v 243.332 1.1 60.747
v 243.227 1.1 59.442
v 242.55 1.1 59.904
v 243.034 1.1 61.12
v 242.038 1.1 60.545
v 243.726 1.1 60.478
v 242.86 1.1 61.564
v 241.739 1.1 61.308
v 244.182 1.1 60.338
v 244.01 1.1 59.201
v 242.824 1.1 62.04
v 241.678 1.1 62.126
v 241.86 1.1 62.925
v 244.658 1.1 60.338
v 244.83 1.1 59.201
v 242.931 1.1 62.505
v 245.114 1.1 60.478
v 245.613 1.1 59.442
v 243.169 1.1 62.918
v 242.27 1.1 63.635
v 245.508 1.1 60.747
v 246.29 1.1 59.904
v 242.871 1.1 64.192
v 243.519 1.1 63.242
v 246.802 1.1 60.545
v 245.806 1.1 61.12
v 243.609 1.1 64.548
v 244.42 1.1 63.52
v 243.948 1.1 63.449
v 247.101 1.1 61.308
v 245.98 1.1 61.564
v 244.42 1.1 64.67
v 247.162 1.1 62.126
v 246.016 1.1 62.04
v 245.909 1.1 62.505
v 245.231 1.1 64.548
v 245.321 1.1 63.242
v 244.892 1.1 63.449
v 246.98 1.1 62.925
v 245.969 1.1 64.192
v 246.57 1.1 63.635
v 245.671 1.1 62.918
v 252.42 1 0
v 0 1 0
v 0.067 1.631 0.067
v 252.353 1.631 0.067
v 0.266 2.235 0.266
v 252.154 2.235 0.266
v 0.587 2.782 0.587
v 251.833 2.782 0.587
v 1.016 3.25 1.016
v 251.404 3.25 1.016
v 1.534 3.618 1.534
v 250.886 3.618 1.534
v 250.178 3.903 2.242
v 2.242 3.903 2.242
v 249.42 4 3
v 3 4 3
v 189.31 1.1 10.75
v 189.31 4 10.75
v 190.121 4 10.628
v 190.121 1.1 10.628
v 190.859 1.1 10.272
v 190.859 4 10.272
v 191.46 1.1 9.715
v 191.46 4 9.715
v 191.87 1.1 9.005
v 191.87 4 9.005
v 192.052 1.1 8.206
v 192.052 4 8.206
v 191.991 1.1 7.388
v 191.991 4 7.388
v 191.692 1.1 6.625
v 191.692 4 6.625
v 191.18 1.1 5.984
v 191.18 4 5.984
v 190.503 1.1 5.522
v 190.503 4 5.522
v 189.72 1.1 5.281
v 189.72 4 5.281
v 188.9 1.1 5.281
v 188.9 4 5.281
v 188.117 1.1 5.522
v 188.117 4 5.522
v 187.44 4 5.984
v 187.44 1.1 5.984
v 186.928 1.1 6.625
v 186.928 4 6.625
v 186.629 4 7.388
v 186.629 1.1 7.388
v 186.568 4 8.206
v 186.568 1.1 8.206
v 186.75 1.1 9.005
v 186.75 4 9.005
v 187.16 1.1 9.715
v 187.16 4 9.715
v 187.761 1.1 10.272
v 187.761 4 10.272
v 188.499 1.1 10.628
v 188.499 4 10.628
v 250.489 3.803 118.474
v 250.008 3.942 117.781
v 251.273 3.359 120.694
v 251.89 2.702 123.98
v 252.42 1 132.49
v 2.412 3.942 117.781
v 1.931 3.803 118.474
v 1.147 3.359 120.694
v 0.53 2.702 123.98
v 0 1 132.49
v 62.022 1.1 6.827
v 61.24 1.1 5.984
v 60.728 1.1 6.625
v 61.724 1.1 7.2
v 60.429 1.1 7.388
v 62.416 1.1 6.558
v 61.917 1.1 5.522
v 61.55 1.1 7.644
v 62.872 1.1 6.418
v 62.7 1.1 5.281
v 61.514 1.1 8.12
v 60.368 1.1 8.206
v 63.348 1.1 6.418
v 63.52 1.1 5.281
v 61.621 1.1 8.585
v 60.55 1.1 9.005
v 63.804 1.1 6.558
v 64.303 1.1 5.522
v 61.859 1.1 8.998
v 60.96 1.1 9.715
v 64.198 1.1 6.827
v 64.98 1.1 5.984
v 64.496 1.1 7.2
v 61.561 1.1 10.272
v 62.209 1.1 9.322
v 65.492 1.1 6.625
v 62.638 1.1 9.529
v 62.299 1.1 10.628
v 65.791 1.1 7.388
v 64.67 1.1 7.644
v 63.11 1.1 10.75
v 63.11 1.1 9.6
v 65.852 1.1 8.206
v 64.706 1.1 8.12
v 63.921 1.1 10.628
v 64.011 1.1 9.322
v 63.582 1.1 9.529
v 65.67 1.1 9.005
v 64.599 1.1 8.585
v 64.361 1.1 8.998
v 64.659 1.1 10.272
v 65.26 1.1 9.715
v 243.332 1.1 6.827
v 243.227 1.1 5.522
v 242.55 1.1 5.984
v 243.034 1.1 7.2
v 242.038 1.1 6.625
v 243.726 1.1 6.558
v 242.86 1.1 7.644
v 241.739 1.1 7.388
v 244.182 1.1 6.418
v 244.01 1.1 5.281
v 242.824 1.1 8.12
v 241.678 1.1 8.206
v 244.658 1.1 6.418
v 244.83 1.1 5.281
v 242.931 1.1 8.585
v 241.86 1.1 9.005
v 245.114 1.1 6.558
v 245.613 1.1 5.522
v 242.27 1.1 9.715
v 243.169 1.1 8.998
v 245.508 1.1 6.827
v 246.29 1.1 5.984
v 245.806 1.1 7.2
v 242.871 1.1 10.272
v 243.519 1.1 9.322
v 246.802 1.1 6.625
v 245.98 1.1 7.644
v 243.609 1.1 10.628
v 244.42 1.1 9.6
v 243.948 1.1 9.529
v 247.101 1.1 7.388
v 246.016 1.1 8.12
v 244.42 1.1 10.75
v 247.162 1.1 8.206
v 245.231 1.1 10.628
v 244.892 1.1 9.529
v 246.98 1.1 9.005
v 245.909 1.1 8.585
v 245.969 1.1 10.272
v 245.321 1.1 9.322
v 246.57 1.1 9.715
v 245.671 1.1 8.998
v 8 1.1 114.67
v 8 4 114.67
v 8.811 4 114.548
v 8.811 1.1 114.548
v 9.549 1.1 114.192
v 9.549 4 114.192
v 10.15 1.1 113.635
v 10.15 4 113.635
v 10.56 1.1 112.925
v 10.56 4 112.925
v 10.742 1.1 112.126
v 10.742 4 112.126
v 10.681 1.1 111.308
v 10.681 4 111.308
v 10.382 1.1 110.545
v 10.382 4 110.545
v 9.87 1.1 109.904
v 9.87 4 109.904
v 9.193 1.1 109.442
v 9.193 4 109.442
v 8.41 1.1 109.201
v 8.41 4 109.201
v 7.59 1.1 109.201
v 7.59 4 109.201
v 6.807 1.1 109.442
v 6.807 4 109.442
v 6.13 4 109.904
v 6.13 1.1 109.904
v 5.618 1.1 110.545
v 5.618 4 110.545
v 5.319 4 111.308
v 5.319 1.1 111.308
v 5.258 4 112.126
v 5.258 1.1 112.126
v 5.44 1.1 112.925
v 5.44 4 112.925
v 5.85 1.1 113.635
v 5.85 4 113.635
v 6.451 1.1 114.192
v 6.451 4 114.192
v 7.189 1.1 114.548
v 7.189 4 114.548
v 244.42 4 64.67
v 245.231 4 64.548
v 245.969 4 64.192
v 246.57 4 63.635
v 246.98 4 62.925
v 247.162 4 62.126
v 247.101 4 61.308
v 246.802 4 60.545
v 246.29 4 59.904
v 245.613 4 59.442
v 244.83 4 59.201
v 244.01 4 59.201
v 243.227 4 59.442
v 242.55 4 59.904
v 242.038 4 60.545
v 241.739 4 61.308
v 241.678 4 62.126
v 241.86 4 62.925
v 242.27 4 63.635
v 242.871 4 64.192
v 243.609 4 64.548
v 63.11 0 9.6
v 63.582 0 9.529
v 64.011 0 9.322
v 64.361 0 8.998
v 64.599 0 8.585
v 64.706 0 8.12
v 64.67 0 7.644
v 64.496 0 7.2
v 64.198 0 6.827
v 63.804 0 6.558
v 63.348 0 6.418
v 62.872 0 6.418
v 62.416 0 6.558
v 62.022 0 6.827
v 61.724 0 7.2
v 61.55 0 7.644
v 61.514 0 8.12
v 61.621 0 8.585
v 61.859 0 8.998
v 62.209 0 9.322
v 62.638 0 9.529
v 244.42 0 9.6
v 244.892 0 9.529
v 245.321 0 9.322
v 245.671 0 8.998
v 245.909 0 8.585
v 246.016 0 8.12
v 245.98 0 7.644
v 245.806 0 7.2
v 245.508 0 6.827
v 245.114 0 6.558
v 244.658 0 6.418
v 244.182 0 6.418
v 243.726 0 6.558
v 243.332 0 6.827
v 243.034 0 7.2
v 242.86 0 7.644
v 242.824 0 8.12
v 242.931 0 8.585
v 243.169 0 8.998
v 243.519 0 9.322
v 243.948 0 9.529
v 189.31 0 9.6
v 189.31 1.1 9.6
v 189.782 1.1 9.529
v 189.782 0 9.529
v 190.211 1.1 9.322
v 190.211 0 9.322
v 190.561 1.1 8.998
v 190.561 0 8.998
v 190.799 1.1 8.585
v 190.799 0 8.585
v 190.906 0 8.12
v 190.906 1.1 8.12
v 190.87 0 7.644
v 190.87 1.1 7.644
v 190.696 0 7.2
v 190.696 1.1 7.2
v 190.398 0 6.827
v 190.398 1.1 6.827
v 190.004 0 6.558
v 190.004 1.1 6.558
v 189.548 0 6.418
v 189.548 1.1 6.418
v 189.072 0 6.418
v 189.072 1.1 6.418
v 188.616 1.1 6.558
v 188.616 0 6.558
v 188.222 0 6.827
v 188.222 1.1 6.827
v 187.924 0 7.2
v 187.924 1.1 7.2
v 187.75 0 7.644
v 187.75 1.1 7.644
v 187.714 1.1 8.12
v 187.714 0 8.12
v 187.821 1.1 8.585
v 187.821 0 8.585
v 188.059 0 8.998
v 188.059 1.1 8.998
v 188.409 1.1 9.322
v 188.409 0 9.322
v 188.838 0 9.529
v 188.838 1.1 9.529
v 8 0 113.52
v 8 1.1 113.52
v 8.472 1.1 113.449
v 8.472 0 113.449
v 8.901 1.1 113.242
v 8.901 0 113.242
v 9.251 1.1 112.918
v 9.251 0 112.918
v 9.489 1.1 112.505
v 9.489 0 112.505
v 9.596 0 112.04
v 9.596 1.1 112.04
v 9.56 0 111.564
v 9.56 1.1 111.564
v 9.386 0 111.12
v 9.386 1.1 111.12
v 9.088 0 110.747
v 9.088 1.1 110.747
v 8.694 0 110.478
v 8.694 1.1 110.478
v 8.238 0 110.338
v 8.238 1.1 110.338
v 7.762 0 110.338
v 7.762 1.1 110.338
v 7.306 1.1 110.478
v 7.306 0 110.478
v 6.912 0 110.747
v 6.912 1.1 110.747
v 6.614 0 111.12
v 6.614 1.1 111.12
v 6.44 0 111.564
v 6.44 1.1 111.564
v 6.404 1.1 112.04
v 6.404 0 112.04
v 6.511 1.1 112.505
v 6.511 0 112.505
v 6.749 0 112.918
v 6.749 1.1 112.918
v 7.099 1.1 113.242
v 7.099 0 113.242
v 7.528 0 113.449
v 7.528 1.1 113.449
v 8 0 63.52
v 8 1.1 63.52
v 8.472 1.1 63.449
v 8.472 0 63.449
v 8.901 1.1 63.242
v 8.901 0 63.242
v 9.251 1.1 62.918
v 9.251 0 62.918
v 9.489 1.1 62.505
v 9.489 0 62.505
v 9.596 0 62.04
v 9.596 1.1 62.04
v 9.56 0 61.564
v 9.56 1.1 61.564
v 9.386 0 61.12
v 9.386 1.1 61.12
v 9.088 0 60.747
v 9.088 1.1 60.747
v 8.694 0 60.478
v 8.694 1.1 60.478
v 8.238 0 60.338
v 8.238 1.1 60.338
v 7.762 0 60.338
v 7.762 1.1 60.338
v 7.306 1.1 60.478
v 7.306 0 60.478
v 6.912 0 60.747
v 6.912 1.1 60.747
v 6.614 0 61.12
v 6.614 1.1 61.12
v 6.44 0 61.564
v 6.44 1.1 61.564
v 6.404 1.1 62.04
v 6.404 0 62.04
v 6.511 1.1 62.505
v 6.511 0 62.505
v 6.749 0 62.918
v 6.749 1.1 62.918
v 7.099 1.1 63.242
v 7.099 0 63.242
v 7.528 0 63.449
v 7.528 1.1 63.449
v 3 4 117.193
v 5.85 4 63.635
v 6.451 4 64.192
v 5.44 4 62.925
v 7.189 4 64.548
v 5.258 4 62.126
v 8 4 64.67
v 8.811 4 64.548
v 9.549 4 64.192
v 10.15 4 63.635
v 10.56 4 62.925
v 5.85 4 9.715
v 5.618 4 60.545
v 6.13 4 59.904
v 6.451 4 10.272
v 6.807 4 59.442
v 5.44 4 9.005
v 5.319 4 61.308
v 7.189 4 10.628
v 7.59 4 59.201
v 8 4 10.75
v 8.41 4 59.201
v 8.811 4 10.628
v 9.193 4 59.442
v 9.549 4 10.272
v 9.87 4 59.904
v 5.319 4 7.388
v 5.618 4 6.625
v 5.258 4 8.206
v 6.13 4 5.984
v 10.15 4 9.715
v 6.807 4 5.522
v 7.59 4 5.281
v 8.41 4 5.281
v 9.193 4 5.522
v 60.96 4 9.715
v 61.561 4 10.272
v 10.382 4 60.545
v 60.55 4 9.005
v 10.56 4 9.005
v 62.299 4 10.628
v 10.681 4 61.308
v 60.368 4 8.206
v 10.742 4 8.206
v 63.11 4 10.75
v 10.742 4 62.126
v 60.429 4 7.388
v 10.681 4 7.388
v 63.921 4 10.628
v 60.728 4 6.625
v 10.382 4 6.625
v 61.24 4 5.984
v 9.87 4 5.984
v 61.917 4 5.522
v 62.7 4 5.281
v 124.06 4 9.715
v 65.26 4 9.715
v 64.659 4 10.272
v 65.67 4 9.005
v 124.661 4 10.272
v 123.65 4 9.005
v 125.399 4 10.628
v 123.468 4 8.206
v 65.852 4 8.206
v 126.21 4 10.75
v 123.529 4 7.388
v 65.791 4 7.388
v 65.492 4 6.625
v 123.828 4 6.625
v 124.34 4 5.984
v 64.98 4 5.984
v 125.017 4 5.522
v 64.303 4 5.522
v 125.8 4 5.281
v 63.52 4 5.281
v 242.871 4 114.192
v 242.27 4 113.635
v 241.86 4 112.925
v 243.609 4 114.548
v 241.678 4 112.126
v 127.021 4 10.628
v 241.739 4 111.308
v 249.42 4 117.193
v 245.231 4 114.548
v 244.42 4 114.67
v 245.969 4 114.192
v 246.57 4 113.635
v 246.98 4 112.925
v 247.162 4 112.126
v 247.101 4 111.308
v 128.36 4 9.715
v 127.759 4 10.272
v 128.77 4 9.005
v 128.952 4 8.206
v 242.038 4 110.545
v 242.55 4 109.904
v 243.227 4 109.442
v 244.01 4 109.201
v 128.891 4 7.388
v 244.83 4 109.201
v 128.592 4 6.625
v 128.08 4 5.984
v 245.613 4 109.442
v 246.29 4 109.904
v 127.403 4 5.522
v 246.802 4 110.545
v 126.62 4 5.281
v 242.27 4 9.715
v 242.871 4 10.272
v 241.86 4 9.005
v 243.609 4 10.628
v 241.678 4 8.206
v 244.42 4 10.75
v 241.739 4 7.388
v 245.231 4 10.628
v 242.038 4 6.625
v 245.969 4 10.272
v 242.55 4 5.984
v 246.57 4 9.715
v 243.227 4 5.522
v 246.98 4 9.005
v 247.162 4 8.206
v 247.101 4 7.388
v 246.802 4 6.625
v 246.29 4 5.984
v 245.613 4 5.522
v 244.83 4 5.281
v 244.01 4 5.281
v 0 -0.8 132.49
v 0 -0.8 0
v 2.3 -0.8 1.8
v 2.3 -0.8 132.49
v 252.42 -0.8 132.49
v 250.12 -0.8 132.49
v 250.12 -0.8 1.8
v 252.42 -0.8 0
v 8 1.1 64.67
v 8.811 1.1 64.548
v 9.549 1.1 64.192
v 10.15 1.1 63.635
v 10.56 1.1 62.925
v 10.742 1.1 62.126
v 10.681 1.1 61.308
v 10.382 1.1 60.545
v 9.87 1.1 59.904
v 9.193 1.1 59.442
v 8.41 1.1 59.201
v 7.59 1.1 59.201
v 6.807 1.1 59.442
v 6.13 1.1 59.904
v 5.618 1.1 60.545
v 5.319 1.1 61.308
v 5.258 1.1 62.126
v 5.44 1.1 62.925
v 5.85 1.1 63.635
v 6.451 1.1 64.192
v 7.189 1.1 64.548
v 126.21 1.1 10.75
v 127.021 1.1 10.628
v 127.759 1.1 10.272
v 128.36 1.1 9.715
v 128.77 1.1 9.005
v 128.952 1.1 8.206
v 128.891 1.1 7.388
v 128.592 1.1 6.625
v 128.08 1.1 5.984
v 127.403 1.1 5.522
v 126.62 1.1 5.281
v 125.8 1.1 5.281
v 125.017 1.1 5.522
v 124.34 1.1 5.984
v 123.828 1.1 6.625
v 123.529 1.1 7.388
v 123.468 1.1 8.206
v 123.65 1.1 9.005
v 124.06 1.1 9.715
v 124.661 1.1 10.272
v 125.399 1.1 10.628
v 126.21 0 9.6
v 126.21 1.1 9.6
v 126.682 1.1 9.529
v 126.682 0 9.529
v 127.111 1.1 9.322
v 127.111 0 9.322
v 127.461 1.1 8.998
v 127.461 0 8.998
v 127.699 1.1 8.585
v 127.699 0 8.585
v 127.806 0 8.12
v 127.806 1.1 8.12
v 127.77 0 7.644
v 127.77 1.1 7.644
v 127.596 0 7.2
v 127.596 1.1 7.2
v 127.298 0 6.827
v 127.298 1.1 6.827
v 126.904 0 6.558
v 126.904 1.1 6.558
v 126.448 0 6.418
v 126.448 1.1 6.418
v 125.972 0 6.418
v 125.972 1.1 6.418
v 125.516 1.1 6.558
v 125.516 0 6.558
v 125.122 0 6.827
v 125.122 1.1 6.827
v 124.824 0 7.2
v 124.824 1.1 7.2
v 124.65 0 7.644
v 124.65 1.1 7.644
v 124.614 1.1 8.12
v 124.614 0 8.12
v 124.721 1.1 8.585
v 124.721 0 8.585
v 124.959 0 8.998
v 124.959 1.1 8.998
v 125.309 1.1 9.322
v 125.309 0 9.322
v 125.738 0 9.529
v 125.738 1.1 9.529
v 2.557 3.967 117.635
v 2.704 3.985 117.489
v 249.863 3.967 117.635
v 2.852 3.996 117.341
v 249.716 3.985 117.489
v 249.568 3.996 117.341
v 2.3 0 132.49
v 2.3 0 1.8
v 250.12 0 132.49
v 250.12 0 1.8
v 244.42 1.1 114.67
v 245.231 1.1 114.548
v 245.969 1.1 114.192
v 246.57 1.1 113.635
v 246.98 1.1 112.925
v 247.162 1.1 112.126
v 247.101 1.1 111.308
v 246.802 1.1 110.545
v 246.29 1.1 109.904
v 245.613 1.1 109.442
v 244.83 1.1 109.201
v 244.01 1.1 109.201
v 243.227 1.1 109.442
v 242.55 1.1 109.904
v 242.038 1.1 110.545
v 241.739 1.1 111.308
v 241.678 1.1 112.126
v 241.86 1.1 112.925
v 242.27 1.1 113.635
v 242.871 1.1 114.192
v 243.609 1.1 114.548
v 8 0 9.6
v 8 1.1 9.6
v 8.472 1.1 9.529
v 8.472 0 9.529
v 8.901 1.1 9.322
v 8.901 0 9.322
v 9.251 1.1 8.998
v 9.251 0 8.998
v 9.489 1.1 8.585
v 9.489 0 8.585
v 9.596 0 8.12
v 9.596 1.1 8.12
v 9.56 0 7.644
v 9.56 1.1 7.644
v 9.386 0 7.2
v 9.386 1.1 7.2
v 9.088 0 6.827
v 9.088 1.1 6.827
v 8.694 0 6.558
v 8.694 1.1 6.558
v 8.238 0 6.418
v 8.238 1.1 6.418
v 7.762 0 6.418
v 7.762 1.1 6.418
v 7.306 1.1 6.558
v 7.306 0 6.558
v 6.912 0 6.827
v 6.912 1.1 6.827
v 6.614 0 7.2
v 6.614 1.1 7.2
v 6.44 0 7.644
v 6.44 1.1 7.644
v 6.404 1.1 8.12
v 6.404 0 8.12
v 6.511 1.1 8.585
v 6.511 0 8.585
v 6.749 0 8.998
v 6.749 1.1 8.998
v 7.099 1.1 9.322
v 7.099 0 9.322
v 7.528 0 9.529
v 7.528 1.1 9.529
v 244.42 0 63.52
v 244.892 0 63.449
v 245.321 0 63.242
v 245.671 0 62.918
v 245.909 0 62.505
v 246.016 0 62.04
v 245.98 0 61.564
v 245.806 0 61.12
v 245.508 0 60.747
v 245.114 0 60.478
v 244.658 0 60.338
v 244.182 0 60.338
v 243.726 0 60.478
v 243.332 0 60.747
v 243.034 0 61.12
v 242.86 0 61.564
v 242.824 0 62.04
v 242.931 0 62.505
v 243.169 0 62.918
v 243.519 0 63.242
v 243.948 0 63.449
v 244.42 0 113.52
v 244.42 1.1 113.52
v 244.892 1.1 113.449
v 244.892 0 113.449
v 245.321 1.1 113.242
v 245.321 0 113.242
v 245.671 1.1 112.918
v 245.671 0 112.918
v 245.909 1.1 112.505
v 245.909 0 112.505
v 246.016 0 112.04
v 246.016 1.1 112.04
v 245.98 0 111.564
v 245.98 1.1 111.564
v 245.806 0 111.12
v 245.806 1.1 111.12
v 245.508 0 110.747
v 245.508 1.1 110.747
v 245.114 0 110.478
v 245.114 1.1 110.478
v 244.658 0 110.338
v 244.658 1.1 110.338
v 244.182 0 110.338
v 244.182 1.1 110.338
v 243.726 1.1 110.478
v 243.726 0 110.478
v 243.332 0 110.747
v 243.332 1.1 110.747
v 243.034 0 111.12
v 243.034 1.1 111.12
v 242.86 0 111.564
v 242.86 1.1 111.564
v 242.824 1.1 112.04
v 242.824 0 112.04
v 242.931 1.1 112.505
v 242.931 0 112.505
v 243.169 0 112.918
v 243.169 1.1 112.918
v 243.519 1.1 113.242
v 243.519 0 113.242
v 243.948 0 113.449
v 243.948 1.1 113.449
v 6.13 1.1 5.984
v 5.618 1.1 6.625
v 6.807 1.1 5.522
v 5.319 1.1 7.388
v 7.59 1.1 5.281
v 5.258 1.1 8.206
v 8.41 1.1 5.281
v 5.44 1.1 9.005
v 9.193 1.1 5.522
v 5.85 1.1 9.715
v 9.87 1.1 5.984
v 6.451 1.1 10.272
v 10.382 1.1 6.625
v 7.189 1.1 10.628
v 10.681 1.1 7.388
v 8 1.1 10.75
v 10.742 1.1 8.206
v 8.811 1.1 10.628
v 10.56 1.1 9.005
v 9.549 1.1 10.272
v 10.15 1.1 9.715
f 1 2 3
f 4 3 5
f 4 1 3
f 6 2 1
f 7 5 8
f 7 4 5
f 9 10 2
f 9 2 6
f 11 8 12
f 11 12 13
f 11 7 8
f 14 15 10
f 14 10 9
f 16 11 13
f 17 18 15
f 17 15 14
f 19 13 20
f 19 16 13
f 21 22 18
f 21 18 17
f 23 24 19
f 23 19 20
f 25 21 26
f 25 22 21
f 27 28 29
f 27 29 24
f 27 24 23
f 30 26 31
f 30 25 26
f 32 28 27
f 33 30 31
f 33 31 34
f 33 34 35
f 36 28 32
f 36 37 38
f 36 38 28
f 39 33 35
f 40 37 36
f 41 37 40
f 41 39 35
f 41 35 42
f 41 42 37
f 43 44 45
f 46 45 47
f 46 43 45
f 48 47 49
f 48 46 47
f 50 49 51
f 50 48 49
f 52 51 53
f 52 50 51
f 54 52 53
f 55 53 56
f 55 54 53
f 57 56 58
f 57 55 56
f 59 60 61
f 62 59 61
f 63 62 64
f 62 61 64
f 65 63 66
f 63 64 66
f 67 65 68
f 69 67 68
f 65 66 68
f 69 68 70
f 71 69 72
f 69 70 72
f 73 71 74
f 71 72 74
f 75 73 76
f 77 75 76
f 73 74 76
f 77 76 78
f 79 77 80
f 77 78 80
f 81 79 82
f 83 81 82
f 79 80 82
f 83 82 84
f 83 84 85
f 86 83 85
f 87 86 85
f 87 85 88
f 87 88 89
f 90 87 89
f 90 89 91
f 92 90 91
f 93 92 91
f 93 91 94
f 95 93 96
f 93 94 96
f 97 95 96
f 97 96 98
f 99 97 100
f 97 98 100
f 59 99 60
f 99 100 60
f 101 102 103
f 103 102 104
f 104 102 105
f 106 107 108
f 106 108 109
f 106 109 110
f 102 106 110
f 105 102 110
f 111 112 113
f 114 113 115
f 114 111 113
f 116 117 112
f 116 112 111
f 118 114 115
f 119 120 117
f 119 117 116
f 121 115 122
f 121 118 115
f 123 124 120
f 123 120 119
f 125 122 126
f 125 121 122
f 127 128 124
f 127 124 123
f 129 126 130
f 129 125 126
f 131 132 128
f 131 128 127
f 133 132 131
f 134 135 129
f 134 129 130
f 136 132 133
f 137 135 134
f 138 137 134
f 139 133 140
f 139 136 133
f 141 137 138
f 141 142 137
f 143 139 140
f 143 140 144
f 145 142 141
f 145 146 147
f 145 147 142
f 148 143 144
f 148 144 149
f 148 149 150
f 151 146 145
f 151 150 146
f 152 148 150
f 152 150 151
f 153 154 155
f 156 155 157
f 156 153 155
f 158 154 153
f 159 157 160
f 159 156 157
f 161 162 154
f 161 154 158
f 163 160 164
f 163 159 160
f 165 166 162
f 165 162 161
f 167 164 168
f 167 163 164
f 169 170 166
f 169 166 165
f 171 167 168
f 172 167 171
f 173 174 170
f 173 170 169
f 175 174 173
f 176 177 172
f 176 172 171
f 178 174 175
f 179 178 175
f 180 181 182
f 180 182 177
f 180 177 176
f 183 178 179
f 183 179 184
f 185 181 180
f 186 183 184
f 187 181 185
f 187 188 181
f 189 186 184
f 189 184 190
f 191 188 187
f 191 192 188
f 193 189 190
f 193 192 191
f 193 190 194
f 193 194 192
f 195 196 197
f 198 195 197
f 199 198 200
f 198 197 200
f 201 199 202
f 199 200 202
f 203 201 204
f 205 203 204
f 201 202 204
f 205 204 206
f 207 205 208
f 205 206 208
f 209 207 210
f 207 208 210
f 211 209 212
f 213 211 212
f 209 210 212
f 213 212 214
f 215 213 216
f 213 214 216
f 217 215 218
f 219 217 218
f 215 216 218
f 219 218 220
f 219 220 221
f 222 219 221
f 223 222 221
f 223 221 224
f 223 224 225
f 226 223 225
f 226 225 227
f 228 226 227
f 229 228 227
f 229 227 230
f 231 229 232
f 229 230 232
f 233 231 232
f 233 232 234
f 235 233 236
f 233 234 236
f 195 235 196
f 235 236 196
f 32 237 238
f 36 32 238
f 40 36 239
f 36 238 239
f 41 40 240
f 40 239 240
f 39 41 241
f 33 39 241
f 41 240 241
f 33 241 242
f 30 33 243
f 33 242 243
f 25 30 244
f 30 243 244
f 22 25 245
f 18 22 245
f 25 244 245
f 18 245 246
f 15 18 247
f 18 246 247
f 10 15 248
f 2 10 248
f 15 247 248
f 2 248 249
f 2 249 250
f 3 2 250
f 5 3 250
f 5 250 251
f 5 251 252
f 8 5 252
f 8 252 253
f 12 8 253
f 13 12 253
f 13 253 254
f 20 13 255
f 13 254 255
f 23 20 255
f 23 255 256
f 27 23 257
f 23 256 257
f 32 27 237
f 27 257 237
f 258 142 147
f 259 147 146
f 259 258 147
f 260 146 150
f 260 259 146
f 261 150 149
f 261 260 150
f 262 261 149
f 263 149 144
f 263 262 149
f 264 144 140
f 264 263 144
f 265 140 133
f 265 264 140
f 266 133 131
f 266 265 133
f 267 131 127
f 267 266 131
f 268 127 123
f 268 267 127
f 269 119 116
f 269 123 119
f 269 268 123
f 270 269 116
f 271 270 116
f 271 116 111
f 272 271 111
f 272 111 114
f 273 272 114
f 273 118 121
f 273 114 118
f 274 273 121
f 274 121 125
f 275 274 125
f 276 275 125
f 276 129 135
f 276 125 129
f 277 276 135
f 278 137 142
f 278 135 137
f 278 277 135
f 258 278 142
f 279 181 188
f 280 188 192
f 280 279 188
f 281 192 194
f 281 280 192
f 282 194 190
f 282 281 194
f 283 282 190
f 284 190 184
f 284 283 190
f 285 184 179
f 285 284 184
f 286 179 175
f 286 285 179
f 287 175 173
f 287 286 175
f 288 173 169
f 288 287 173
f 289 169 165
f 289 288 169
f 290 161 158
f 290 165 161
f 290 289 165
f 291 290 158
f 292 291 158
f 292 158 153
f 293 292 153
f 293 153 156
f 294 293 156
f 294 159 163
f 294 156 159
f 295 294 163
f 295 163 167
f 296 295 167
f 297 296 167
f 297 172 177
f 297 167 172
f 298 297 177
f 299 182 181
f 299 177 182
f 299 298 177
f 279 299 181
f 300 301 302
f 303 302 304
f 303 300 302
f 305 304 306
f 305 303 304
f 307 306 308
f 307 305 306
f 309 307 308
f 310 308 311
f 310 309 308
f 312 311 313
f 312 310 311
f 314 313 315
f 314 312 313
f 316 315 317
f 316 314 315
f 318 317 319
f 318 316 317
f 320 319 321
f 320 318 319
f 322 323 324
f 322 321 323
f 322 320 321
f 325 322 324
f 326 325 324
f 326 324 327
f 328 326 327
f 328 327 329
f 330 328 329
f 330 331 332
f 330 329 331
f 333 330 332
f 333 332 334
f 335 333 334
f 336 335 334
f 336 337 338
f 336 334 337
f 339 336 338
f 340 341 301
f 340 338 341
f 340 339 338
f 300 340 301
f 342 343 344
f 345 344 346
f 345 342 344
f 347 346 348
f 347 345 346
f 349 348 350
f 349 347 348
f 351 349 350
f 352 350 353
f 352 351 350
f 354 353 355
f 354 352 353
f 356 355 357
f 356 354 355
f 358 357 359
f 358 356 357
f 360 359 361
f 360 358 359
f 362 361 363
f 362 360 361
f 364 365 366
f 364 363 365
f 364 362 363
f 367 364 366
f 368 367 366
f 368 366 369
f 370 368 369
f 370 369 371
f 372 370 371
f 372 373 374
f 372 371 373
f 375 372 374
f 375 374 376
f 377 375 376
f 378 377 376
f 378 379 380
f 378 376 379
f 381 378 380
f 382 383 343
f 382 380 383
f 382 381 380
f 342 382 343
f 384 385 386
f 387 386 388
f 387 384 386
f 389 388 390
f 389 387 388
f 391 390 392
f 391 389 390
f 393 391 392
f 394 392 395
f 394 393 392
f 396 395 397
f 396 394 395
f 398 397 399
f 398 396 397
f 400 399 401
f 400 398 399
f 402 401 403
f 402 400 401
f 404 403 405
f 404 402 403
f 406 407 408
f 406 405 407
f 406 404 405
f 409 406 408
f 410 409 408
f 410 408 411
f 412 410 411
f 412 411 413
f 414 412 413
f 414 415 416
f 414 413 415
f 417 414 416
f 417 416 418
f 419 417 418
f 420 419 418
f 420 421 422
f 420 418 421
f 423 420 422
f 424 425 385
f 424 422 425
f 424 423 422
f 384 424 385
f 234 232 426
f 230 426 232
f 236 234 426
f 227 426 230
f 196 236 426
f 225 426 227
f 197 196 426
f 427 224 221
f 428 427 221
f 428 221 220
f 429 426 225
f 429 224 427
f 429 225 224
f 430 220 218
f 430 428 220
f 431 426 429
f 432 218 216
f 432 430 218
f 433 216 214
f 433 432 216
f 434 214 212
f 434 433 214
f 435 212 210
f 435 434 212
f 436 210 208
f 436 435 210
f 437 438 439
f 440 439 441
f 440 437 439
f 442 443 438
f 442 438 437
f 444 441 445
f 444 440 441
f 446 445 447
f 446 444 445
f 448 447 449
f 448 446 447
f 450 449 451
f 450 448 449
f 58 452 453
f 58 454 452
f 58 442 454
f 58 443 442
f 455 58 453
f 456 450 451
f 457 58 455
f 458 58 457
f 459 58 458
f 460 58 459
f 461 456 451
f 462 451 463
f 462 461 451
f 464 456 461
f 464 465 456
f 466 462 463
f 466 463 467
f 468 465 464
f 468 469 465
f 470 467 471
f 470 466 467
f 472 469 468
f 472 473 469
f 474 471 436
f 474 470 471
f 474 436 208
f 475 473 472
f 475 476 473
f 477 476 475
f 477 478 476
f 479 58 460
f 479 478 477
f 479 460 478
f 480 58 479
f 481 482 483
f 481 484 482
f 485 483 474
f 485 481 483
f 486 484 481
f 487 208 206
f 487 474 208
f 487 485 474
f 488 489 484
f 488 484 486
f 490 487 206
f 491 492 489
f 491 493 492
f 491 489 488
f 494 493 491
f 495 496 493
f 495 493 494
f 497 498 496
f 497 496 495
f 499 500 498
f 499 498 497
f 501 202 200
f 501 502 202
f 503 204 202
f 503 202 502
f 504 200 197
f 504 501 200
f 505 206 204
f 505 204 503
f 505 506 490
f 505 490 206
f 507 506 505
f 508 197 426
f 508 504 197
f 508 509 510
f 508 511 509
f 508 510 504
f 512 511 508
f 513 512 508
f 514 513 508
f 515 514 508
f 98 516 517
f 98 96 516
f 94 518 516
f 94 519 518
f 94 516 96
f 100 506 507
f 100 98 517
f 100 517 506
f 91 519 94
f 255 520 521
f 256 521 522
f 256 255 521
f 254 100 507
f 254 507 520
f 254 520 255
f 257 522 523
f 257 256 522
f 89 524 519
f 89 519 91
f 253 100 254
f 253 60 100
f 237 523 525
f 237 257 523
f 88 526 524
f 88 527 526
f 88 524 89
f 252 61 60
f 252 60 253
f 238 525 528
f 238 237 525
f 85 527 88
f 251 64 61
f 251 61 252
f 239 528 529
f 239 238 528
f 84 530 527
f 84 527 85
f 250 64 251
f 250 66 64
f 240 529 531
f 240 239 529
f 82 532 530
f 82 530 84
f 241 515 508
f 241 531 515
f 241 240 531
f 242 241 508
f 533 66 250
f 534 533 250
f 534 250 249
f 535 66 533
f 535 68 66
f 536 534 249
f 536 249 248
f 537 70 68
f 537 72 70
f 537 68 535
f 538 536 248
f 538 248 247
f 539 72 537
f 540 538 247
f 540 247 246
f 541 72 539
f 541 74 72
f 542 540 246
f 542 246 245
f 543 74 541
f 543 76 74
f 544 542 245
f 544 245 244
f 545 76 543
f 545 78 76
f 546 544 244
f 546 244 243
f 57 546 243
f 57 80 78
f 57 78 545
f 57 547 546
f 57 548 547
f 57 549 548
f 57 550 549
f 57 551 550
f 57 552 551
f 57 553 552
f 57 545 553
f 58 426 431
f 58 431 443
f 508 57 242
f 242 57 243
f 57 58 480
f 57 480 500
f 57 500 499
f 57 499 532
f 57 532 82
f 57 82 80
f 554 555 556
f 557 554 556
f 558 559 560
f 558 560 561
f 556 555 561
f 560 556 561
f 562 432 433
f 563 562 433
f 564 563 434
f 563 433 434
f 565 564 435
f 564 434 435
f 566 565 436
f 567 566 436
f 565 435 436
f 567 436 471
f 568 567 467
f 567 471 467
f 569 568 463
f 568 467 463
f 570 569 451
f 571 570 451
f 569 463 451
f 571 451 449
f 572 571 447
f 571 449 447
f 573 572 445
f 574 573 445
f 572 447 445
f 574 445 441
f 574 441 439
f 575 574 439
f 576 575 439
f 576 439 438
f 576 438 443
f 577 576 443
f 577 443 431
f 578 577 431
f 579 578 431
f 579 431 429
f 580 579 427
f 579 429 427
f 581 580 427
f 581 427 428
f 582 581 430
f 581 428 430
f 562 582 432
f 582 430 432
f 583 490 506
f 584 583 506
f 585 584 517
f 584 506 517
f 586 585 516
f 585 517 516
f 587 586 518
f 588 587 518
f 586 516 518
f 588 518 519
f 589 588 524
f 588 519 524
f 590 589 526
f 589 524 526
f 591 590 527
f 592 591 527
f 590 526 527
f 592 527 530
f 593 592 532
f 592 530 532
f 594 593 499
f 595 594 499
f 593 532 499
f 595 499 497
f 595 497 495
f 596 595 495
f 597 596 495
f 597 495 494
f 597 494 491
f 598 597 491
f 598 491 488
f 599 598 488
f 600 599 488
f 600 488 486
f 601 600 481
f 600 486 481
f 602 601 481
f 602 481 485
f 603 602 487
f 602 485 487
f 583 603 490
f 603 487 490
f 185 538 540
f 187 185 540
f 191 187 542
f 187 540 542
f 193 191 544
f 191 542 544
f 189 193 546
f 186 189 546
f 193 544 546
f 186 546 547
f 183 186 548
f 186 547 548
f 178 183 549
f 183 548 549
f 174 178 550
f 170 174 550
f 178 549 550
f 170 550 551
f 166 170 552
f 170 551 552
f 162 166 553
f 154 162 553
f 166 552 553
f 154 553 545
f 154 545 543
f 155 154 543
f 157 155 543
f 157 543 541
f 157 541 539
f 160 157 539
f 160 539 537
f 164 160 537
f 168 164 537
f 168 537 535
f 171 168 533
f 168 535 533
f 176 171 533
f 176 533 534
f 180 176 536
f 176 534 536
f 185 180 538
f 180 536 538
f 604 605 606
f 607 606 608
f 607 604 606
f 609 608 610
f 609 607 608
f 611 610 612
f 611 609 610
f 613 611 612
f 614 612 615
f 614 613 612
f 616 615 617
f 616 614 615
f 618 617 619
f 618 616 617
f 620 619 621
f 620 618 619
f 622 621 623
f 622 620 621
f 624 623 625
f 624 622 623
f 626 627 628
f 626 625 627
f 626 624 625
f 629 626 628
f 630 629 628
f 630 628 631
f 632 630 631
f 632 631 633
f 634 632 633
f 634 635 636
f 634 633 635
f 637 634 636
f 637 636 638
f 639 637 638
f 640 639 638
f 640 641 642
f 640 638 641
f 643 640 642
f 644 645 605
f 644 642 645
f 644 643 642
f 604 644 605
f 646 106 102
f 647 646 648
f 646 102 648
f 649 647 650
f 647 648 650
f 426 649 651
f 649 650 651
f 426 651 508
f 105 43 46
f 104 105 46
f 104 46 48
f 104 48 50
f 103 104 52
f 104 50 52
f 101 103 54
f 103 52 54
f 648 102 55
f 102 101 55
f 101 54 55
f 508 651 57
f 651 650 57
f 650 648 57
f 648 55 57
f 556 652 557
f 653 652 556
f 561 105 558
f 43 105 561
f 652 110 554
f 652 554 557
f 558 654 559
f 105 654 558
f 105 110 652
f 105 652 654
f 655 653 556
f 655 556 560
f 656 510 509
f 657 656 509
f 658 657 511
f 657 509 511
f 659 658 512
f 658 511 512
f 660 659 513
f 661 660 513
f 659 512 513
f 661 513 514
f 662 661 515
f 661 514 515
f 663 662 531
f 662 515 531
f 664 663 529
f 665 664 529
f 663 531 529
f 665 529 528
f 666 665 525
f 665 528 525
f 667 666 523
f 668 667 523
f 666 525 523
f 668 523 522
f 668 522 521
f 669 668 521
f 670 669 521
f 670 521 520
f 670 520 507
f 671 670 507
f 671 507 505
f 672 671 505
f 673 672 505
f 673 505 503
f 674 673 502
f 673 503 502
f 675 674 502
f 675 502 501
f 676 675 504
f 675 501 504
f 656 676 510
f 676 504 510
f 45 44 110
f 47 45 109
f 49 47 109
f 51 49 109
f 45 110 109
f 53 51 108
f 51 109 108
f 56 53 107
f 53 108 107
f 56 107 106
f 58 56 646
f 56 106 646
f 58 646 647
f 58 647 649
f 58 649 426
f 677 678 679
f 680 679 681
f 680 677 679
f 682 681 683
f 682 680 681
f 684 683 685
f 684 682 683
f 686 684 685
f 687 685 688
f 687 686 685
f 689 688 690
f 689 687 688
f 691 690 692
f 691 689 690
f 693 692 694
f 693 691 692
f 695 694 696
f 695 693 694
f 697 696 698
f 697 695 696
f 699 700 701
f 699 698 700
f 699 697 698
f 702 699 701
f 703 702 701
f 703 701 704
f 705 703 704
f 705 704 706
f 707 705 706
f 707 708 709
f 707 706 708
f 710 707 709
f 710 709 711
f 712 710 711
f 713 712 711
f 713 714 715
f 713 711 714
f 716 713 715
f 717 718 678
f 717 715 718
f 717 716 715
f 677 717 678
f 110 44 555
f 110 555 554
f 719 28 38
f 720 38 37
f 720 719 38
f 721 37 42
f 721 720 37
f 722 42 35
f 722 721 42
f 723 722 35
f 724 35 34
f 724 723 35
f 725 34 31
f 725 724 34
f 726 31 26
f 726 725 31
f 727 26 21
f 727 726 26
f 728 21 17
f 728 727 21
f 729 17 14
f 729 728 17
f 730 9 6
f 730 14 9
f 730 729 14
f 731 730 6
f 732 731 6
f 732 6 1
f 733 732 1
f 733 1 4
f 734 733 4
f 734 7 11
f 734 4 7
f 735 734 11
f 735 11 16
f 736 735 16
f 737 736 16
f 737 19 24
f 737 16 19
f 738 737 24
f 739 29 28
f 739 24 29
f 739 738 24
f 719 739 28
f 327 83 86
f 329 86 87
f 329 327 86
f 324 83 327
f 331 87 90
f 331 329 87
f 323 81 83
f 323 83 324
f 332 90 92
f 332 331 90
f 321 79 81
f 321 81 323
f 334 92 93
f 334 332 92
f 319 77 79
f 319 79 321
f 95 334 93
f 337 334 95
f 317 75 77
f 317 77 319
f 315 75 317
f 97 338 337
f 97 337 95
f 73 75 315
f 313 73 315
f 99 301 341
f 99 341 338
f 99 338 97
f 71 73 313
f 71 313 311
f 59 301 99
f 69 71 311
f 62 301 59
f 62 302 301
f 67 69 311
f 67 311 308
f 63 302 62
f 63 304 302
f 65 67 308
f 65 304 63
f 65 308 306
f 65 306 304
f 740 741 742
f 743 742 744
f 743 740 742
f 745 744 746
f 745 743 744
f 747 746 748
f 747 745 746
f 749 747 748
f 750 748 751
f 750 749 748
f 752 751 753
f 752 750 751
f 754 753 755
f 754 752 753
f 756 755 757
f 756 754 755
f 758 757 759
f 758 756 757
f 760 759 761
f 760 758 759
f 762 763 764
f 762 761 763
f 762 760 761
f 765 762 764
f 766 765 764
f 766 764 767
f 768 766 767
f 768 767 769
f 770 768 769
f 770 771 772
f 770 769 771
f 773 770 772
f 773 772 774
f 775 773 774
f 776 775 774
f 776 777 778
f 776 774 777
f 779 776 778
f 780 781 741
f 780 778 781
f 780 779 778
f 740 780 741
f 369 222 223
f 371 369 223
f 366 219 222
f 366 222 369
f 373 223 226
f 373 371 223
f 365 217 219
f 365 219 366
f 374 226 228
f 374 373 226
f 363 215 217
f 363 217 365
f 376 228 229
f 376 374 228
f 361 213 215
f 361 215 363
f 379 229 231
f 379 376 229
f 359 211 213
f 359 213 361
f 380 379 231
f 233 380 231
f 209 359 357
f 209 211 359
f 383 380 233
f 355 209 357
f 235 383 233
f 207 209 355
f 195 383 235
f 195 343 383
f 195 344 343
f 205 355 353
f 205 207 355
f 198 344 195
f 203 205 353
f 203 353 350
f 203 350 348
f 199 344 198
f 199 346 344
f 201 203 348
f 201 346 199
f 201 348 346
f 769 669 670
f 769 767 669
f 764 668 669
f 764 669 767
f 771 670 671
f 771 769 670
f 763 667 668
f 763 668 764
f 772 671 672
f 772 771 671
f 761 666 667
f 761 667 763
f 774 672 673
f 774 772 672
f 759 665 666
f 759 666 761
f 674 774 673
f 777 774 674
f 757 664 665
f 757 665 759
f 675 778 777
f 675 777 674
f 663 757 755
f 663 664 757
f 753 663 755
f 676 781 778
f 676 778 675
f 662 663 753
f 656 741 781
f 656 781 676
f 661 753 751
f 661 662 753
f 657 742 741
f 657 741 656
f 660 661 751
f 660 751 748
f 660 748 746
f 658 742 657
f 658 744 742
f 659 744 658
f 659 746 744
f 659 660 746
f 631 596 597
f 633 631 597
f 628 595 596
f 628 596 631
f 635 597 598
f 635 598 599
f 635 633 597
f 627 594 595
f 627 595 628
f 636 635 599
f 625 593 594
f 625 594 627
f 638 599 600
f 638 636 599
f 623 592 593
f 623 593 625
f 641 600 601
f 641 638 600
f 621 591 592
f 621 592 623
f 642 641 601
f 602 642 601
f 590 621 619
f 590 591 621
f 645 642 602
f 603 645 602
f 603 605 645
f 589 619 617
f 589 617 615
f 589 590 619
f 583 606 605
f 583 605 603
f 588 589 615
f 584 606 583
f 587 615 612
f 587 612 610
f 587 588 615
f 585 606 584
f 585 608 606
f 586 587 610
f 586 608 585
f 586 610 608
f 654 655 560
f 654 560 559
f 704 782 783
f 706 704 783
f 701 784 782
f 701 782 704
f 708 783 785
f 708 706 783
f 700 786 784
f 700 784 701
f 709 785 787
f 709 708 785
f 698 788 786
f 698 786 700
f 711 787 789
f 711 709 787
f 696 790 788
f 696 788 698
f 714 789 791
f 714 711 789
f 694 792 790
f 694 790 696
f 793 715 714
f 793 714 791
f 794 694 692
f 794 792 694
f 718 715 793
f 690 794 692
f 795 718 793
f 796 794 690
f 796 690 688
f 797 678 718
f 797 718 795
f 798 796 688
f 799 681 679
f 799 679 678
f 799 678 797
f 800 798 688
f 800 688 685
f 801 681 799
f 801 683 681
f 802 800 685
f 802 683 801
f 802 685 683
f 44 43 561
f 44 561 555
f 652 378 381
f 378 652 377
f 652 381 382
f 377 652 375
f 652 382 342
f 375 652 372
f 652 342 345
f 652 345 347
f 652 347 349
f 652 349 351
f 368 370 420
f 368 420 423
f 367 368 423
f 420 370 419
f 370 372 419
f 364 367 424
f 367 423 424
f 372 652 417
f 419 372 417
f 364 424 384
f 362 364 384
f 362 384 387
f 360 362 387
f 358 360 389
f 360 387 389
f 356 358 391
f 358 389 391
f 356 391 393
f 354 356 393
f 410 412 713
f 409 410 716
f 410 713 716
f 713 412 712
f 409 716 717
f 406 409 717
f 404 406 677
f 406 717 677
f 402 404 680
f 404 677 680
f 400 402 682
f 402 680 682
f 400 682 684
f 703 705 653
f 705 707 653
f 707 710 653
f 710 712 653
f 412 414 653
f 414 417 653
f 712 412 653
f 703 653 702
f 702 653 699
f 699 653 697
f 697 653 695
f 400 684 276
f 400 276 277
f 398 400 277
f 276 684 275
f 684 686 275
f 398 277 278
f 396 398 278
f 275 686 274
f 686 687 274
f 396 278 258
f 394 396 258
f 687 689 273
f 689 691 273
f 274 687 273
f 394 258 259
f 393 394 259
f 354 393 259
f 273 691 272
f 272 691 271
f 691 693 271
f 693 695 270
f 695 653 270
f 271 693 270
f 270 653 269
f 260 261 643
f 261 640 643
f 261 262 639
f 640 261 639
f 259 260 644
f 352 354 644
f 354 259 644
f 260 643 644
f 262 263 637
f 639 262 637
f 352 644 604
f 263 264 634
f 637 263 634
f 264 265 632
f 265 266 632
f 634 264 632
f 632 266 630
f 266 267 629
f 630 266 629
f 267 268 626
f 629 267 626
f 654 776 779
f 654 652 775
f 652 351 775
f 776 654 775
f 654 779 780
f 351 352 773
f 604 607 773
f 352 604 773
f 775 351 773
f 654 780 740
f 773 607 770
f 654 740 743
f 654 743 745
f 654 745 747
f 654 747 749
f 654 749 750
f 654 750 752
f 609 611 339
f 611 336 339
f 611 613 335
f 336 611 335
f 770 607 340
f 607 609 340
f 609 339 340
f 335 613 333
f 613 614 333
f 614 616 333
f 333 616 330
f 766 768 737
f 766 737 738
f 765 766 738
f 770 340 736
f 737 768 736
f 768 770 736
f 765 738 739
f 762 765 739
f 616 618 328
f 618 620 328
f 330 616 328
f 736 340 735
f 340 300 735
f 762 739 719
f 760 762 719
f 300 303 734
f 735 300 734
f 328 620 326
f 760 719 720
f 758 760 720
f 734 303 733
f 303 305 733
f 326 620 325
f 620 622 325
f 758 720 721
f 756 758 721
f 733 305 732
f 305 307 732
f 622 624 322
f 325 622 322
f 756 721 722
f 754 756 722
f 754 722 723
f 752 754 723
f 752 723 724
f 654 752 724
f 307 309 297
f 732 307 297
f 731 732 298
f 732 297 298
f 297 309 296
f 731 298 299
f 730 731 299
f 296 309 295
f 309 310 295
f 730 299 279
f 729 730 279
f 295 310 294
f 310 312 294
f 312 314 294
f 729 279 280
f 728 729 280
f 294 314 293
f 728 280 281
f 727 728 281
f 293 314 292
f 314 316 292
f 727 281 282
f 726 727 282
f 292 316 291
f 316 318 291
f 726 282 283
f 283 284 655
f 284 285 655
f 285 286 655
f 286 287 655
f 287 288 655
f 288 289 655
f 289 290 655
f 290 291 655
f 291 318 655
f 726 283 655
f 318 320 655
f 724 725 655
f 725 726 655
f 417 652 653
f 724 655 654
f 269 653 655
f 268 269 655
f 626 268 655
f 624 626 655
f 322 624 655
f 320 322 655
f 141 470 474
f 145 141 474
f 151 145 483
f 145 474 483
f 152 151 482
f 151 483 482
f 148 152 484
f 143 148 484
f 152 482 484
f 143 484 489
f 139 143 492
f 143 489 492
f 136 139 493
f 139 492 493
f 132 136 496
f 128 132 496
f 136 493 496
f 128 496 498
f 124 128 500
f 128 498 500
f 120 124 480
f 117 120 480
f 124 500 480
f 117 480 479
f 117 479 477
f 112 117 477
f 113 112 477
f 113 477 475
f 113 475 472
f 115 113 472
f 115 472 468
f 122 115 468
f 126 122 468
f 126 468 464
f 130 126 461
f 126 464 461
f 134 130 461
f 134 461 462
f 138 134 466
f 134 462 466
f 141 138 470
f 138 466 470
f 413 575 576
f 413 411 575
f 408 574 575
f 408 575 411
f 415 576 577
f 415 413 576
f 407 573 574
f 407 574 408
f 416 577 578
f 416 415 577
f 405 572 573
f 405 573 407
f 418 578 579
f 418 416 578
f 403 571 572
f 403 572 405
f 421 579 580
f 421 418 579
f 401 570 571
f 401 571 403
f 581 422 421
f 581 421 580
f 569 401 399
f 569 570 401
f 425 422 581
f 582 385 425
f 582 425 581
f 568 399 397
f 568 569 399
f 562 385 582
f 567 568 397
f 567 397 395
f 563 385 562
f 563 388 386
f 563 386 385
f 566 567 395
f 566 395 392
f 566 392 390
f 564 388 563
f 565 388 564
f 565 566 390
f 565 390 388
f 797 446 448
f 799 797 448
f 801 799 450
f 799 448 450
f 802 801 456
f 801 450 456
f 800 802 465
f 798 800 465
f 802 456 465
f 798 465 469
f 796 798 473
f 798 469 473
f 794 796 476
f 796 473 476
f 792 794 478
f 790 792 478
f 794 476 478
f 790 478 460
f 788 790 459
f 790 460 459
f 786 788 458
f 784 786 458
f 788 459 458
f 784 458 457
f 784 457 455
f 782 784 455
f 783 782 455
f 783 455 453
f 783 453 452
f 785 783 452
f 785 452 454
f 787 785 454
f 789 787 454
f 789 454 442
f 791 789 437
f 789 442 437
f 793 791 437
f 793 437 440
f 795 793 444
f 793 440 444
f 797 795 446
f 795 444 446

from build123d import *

# Parameters (mm, degrees)
SKETCH1_W           = 247.82
SKETCH1_H           = 120.12
SKETCH1_R           = 1.6
SKETCH1_H_2         = 10.57
SKETCH1_H_3         = 1.8
BOSS_EXTRUDE1_DEPTH = 4
SKETCH1_5_W         = 247.82
SKETCH1_5_H         = 1.8
BOSS_EXTRUDE2_DEPTH = 0.8
SKETCH1_6_W         = 247.82
SKETCH1_6_H         = 10.57
BOSS_EXTRUDE3_DEPTH = 1.4
SKETCH2_R           = 2.75
CUT_EXTRUDE1_DEPTH  = 2.9
CUT_EXTRUDE2_REACH  = 287.106
FILLET1_R           = 3


with BuildPart() as part:
    # Sketch1 → Boss-Extrude1 (new body)
    # profile 1 of 5: a face of its own
    with BuildSketch(Plane(origin=(0, 0, 0), x_dir=(1, 0, 0), z_dir=(0, 1, 0))):
        with Locations((126.21, -61.86)):
            Rectangle(SKETCH1_W, SKETCH1_H)
        with Locations(Location((8, -111.92, 0), (0, 0, 270))):
            Circle(SKETCH1_R, mode=Mode.SUBTRACT)
        with Locations(Location((244.42, -111.92, 0), (0, 0, 270))):
            Circle(SKETCH1_R, mode=Mode.SUBTRACT)
        with Locations(Location((8, -61.92, 0), (0, 0, 270))):
            Circle(SKETCH1_R, mode=Mode.SUBTRACT)
        with Locations(Location((8, -8, 0), (0, 0, 270))):
            Circle(SKETCH1_R, mode=Mode.SUBTRACT)
        with Locations(Location((63.11, -8, 0), (0, 0, 270))):
            Circle(SKETCH1_R, mode=Mode.SUBTRACT)
        with Locations(Location((244.42, -61.92, 0), (0, 0, 270))):
            Circle(SKETCH1_R, mode=Mode.SUBTRACT)
        with Locations(Location((126.21, -8, 0), (0, 0, 270))):
            Circle(SKETCH1_R, mode=Mode.SUBTRACT)
        with Locations(Location((189.31, -8, 0), (0, 0, 270))):
            Circle(SKETCH1_R, mode=Mode.SUBTRACT)
        with Locations(Location((244.42, -8, 0), (0, 0, 270))):
            Circle(SKETCH1_R, mode=Mode.SUBTRACT)
    # profile 2 of 5: a face of its own
    with BuildSketch(Plane(origin=(0, 0, 0), x_dir=(1, 0, 0), z_dir=(0, 1, 0))):
        Polygon((252.42, 0), (250.12, 0), (250.12, -1.8), (250.12, -121.92), (250.12, -132.49), (252.42, -132.49), align=None)
    # profile 3 of 5: a face of its own
    with BuildSketch(Plane(origin=(0, 0, 0), x_dir=(1, 0, 0), z_dir=(0, 1, 0))):
        with Locations((126.21, -127.205)):
            Rectangle(SKETCH1_W, SKETCH1_H_2)
    # profile 4 of 5: a face of its own
    with BuildSketch(Plane(origin=(0, 0, 0), x_dir=(1, 0, 0), z_dir=(0, 1, 0))):
        Polygon((2.3, 0), (0, 0), (0, -132.49), (2.3, -132.49), (2.3, -121.92), (2.3, -1.8), align=None)
    # profile 5 of 5: a face of its own
    with BuildSketch(Plane(origin=(0, 0, 0), x_dir=(1, 0, 0), z_dir=(0, 1, 0))):
        with Locations((126.21, -0.9)):
            Rectangle(SKETCH1_W, SKETCH1_H_3)
    extrude(amount=BOSS_EXTRUDE1_DEPTH)

    # Sketch1<5> → Boss-Extrude2 (add)
    with BuildSketch(Plane(origin=(0, 0, 0), x_dir=(1, 0, 0), z_dir=(0, 1, 0))):
        Polygon((2.3, 0), (0, 0), (0, -132.49), (2.3, -132.49), (2.3, -121.92), (2.3, -1.8), align=None)
        with Locations((126.21, -0.9)):
            Rectangle(SKETCH1_5_W, SKETCH1_5_H)
        Polygon((252.42, 0), (250.12, 0), (250.12, -1.8), (250.12, -121.92), (250.12, -132.49), (252.42, -132.49), align=None)
    extrude(amount=-BOSS_EXTRUDE2_DEPTH)

    # Sketch1<6> → Boss-Extrude3 (add)
    with BuildSketch(Plane(origin=(0, 0, 0), x_dir=(1, 0, 0), z_dir=(0, 1, 0))):
        with Locations((126.21, -127.205)):
            Rectangle(SKETCH1_6_W, SKETCH1_6_H)
    extrude(amount=BOSS_EXTRUDE3_DEPTH)

    # Sketch2 → Cut-Extrude1 (cut)
    with BuildSketch(Plane(origin=(0, 4, 0), x_dir=(1, 0, 0), z_dir=(0, 1, 0))):
        with Locations(Location((8, -8, 0), (0, 0, 270))):
            Circle(SKETCH2_R)
        with Locations(Location((63.11, -8, 0), (0, 0, 270))):
            Circle(SKETCH2_R)
        with Locations(Location((126.21, -8, 0), (0, 0, 270))):
            Circle(SKETCH2_R)
        with Locations(Location((189.31, -8, 0), (0, 0, 270))):
            Circle(SKETCH2_R)
        with Locations(Location((244.42, -8, 0), (0, 0, 270))):
            Circle(SKETCH2_R)
        with Locations(Location((244.42, -61.92, 0), (0, 0, 270))):
            Circle(SKETCH2_R)
        with Locations(Location((244.42, -111.92, 0), (0, 0, 270))):
            Circle(SKETCH2_R)
        with Locations(Location((8, -111.92, 0), (0, 0, 270))):
            Circle(SKETCH2_R)
        with Locations(Location((8, -61.92, 0), (0, 0, 270))):
            Circle(SKETCH2_R)
    extrude(amount=-CUT_EXTRUDE1_DEPTH, mode=Mode.SUBTRACT)

    # Sketch3 → Cut-Extrude2 (cut, up to next)
    with BuildSketch(Plane.ZY, mode=Mode.PRIVATE) as cut_extrude2_sk1:
        Polygon((117.49, 4), (132.49, 1), (132.49, 4), align=None)
    cut_extrude2_tool1 = extrude(cut_extrude2_sk1.sketch, amount=-CUT_EXTRUDE2_REACH, mode=Mode.PRIVATE) & part.part
    add(cut_extrude2_tool1.solids().sort_by_distance((0, 3, 127.49))[0], mode=Mode.SUBTRACT)

    # Fillet1
    fillet1_edges = [part.edges().sort_by_distance(p)[0] for p in [
        (0, 4, 58.745),
        (126.21, 4, 0),
        (126.21, 4, 117.49),
        (252.42, 4, 58.745),
    ]]
    fillet(fillet1_edges, radius=FILLET1_R - 0.0001)  # a hair under: the kernel refuses the full size


solid = part.part
